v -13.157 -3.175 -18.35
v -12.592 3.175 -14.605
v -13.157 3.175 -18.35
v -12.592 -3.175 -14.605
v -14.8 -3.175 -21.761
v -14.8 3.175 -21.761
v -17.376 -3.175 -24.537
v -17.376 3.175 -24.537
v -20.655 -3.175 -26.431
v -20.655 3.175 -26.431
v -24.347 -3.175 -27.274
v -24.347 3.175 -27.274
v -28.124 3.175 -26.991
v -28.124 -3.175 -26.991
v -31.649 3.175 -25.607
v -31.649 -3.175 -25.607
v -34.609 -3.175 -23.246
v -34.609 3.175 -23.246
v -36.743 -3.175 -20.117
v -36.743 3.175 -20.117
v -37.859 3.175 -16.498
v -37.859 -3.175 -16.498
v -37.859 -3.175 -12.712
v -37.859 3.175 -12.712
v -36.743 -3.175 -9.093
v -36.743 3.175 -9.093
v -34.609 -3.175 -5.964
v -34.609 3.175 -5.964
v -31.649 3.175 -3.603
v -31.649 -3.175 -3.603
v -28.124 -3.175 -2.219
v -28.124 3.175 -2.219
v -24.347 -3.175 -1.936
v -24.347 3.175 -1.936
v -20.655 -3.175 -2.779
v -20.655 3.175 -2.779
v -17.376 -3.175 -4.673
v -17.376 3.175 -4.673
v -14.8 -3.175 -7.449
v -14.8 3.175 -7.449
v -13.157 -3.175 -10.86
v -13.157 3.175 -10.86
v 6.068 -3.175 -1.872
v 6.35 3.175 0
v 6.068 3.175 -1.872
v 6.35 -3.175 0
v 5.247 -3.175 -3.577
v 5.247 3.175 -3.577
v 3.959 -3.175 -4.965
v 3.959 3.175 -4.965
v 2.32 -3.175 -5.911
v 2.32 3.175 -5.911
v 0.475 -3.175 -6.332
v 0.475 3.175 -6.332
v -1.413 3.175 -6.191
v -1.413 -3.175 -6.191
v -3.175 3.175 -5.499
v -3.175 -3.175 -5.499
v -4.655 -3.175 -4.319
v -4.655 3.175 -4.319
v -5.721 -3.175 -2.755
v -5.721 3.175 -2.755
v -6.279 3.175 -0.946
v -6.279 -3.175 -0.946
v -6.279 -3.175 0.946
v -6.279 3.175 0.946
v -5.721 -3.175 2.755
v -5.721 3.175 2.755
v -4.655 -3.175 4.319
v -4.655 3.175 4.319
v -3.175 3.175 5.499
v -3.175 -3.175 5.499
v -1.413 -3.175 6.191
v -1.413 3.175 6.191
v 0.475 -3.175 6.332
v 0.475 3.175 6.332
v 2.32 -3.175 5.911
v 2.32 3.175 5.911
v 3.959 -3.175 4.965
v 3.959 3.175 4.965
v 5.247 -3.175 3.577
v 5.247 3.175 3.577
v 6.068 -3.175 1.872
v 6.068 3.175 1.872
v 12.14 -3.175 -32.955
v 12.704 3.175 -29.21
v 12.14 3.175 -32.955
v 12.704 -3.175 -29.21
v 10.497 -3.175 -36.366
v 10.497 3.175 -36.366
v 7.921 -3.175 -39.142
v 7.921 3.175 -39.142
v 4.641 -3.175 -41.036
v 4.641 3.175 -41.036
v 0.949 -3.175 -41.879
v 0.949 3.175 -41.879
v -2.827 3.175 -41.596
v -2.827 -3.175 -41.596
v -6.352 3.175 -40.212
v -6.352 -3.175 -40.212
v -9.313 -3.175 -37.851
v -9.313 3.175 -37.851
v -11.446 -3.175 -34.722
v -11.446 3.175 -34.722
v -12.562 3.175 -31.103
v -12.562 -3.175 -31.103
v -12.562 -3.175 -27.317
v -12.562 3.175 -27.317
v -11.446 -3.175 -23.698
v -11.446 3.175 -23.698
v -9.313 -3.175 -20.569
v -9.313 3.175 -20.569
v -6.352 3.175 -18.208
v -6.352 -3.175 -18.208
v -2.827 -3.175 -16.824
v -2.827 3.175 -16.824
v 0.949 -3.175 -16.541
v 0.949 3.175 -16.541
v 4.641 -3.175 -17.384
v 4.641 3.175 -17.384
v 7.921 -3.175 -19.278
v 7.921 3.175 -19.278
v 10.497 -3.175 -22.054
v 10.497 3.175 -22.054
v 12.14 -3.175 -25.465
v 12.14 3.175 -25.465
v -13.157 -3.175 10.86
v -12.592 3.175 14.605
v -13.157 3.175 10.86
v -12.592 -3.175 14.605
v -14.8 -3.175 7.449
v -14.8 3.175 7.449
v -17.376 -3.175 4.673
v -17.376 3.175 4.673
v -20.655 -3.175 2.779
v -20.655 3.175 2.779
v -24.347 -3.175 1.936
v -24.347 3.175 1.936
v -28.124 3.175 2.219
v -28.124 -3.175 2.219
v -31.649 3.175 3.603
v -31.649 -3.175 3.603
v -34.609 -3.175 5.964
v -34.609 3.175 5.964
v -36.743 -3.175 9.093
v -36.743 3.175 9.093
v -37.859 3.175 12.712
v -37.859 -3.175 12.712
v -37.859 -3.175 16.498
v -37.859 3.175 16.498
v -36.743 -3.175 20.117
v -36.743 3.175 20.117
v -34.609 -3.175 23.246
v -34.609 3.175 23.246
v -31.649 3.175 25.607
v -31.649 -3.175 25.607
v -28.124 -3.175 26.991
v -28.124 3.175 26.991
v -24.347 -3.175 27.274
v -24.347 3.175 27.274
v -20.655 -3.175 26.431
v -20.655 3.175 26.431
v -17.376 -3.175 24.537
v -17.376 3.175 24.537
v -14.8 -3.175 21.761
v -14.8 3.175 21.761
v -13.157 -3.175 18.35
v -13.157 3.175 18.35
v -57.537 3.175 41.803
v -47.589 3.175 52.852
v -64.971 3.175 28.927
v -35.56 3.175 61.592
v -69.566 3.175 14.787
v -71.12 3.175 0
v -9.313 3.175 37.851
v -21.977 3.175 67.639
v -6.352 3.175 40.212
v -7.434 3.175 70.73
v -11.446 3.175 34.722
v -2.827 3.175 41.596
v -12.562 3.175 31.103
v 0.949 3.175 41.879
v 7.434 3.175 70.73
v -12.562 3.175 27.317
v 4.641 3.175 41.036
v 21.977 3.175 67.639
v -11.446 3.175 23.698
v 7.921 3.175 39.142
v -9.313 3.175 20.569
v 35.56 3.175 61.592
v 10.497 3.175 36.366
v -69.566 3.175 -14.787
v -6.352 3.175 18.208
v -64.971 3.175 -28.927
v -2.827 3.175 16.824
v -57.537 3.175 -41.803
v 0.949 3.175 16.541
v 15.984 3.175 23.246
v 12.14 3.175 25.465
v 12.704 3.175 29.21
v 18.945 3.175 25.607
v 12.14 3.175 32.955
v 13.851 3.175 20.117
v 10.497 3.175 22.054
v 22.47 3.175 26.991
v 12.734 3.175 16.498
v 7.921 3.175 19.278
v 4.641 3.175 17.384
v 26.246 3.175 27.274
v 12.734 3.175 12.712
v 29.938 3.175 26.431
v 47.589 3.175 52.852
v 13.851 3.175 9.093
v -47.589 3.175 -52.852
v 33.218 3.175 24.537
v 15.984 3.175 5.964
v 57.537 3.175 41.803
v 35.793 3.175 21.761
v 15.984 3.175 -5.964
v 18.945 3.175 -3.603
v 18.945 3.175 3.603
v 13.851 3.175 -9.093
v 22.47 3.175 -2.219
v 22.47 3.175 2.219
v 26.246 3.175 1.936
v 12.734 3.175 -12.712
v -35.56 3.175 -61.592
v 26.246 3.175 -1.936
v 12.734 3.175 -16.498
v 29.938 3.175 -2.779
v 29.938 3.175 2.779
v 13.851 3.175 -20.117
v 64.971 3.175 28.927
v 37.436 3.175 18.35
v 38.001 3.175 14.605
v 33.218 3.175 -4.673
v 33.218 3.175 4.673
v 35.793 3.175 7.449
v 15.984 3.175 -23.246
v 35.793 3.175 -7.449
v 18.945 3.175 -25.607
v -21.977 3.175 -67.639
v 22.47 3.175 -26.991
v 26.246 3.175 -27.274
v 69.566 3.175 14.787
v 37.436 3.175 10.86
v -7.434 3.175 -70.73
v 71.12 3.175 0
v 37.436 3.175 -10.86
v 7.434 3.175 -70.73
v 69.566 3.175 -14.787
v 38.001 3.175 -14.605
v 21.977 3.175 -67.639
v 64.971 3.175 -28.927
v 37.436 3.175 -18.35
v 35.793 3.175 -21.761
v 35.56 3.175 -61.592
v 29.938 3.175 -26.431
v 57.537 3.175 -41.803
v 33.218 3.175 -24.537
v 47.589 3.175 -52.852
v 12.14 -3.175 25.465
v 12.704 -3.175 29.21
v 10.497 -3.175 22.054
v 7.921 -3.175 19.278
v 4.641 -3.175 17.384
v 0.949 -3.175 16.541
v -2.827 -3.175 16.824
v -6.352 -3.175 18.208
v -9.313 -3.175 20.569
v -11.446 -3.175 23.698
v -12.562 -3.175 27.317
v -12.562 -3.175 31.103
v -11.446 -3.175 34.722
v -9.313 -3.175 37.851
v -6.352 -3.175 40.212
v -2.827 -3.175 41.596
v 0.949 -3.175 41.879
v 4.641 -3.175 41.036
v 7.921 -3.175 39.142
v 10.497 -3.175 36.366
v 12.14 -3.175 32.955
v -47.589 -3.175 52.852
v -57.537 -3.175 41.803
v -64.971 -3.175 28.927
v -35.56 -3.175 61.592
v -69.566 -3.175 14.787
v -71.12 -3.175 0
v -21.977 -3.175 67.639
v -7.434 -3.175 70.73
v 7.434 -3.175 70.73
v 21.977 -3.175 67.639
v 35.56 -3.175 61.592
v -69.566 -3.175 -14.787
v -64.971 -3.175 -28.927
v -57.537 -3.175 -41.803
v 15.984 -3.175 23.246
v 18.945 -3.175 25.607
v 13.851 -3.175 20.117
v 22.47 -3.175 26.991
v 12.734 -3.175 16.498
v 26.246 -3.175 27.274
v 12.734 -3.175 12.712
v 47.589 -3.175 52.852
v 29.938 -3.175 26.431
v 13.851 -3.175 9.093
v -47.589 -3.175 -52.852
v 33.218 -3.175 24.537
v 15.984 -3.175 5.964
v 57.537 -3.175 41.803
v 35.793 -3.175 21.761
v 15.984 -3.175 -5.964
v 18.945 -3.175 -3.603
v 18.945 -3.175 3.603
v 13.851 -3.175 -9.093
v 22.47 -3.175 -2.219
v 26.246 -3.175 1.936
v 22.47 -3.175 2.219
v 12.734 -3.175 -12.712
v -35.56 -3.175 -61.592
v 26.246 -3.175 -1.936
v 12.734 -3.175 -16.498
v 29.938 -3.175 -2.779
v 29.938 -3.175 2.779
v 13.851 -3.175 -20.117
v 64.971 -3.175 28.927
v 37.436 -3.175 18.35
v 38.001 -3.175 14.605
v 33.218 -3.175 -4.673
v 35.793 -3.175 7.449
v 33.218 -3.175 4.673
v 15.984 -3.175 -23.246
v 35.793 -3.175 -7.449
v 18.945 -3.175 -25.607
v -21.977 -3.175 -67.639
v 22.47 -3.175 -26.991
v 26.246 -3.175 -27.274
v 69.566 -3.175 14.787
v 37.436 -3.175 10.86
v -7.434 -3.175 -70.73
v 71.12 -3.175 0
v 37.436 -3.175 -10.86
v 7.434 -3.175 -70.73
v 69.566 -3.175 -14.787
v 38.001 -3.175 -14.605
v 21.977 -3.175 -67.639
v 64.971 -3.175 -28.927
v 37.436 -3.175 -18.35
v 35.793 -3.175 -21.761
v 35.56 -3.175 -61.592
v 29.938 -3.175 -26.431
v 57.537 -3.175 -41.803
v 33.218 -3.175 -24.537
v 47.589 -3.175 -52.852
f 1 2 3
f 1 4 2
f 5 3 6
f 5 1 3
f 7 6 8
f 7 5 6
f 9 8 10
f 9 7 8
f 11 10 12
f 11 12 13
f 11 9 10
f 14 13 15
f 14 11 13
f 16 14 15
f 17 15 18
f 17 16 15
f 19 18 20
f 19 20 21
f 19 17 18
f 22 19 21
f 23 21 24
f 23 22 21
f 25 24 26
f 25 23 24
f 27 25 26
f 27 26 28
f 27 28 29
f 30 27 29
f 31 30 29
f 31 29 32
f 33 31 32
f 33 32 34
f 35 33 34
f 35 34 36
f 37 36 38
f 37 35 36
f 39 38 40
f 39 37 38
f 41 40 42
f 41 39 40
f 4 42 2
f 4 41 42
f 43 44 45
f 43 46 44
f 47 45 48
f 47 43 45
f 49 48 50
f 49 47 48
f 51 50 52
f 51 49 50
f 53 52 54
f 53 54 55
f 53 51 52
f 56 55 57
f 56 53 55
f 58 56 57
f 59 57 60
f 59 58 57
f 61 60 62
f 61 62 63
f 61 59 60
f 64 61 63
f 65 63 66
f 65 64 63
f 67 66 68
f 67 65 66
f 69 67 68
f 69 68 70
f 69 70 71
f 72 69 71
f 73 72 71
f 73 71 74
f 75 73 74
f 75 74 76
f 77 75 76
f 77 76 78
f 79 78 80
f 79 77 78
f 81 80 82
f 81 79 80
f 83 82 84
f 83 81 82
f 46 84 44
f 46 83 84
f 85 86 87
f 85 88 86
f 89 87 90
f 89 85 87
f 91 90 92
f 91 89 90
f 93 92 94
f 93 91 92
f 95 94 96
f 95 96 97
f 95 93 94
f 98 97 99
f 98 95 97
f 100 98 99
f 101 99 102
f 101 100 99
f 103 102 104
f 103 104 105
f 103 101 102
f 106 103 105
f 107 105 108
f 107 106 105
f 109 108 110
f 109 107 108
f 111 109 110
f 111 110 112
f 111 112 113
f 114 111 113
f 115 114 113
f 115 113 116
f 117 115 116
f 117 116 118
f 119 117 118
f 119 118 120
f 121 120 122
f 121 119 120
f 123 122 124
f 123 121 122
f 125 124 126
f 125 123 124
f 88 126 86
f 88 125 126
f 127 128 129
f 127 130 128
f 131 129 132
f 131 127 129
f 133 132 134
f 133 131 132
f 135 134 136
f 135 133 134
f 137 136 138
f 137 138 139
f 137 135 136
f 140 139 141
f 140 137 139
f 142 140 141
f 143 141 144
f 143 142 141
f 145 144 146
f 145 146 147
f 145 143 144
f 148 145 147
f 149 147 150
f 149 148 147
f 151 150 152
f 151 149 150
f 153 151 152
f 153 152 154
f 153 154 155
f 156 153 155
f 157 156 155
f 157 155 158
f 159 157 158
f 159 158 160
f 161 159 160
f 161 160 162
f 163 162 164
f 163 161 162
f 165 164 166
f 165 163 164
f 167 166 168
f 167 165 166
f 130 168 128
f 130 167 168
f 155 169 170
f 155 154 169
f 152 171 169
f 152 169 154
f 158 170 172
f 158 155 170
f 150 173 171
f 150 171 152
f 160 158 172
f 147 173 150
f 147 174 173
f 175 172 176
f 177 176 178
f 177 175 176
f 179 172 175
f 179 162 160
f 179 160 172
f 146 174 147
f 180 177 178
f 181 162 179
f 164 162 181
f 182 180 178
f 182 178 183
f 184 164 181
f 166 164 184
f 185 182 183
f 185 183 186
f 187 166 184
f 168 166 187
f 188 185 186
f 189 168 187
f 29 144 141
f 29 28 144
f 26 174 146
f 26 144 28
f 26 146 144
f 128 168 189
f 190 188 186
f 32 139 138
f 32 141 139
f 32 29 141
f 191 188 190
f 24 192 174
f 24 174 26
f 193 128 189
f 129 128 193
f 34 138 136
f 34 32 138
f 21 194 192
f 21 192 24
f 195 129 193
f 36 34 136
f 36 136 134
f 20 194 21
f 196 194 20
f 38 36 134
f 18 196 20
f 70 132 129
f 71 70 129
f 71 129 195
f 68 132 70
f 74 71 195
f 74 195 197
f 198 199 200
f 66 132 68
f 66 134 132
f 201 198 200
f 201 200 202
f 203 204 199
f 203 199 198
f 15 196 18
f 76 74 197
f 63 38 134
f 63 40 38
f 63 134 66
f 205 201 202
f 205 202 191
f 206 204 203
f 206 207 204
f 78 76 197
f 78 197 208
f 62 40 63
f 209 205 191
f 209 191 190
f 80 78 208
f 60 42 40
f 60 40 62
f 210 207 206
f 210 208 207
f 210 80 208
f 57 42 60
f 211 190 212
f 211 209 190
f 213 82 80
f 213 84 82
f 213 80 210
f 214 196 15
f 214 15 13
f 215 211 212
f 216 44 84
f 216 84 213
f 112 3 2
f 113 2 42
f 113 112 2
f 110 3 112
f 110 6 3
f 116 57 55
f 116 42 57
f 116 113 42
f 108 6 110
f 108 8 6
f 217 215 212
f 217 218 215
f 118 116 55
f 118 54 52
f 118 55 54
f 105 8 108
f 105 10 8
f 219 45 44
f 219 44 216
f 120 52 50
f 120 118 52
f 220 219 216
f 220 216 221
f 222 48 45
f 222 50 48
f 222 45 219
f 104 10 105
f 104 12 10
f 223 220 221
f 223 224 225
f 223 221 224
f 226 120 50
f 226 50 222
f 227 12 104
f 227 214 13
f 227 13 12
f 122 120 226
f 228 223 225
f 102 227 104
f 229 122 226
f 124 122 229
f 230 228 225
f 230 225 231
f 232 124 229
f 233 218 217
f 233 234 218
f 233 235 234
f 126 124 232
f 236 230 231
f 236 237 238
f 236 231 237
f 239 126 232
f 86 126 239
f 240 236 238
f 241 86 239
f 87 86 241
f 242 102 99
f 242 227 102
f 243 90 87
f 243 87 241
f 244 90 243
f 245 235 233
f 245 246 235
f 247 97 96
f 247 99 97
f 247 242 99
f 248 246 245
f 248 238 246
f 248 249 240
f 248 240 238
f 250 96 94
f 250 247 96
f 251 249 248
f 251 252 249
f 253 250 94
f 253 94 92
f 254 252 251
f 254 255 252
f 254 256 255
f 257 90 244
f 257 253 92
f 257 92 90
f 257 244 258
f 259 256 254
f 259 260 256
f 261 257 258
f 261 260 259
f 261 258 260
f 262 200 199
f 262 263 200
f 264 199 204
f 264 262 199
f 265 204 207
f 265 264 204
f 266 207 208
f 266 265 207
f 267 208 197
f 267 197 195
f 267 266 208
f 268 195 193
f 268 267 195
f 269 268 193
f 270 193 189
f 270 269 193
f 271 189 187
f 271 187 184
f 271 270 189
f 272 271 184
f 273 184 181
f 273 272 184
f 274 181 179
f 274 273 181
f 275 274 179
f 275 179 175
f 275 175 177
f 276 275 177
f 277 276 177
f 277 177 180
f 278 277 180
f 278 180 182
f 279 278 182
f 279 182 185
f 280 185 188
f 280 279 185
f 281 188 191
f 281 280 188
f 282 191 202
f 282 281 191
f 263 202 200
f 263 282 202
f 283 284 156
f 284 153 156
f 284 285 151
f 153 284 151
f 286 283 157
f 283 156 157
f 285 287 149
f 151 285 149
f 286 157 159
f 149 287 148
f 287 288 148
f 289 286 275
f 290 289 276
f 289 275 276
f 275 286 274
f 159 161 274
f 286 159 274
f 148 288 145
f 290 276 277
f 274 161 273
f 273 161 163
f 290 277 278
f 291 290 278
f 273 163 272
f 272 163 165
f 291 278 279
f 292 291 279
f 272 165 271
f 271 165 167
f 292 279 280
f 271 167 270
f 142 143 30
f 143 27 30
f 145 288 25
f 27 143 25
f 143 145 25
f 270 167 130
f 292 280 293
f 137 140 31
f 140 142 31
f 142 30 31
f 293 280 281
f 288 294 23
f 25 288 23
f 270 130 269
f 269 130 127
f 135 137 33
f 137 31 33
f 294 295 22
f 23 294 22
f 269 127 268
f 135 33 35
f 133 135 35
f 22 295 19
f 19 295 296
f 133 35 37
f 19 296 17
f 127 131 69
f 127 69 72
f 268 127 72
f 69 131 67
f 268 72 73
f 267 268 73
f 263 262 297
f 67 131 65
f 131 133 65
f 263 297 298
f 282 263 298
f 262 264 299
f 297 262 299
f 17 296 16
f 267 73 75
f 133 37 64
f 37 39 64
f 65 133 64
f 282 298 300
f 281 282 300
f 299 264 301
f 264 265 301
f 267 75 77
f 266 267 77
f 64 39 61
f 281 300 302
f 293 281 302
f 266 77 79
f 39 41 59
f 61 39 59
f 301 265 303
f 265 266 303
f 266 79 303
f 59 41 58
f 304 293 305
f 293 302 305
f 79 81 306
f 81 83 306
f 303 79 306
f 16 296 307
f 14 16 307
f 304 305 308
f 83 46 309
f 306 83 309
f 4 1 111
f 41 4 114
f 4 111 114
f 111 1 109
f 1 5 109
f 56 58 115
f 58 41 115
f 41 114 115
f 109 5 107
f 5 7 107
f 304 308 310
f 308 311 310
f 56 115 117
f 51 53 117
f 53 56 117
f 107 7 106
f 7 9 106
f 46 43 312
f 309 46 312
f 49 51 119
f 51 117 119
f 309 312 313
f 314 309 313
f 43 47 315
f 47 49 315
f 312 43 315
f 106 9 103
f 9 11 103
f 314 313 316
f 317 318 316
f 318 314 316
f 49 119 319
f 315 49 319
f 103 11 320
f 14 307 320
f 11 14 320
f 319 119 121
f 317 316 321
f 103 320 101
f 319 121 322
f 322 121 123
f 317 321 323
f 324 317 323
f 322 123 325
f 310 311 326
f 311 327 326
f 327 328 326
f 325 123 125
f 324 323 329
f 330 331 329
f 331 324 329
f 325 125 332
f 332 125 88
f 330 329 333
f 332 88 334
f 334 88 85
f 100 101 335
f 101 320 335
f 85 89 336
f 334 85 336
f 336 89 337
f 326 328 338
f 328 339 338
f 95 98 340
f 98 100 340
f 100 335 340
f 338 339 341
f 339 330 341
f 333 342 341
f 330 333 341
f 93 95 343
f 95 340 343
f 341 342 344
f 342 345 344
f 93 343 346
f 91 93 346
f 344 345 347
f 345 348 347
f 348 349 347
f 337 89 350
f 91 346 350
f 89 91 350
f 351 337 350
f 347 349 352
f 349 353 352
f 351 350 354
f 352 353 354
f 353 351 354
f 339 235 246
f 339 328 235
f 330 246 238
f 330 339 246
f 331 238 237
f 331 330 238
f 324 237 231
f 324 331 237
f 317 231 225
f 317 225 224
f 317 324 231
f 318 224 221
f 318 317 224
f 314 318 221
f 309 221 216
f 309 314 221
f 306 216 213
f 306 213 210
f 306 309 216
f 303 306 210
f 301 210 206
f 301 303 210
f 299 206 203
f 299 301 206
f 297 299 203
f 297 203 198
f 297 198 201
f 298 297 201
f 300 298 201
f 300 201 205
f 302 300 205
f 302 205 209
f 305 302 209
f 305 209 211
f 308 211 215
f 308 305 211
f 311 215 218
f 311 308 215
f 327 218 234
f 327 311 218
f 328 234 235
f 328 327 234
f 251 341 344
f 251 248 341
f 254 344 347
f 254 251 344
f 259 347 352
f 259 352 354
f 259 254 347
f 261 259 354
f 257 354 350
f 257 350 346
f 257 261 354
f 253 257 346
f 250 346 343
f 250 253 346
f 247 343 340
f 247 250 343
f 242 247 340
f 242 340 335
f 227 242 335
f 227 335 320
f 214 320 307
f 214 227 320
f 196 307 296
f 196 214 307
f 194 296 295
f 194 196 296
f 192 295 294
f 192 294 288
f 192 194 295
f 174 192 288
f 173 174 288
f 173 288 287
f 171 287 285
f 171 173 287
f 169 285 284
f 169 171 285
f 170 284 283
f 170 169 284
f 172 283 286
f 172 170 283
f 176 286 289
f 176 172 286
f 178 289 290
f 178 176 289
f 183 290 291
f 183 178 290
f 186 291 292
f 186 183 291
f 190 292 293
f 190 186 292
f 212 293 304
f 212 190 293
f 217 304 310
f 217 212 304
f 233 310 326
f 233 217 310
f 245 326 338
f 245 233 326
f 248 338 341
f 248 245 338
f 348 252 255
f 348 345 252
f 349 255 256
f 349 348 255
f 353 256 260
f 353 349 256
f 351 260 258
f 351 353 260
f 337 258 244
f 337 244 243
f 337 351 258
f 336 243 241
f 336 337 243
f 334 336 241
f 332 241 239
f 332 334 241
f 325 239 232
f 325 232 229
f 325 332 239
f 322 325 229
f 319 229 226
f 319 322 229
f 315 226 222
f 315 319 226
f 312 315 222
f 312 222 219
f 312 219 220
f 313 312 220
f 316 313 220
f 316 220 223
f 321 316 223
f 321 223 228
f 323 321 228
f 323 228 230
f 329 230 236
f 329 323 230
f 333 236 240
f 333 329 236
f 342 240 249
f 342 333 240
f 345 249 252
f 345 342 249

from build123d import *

# Parameters (mm, degrees)
SKETCH1_R           = 71.12
SKETCH1_R_2         = 12.704134002
SKETCH1_R_3         = 6.35
BOSS_EXTRUDE1_DEPTH = 3.175


with BuildPart() as part:
    # Sketch1 → Boss-Extrude1 (new body, symmetric)
    with BuildSketch(Plane(origin=(0, 0, 0), x_dir=(1, 0, 0), z_dir=(0, 1, 0))):
        Circle(SKETCH1_R)
        with Locations((-25.296602045, 14.605)):
            Circle(SKETCH1_R_2, mode=Mode.SUBTRACT)
        with Locations((-25.296602045, -14.605)):
            Circle(SKETCH1_R_2, mode=Mode.SUBTRACT)
        with Locations((0, -29.21)):
            Circle(SKETCH1_R_2, mode=Mode.SUBTRACT)
        with Locations((25.296602045, -14.605)):
            Circle(SKETCH1_R_2, mode=Mode.SUBTRACT)
        with Locations((25.296602045, 14.605)):
            Circle(SKETCH1_R_2, mode=Mode.SUBTRACT)
        with Locations((0, 29.21)):
            Circle(SKETCH1_R_2, mode=Mode.SUBTRACT)
        Circle(SKETCH1_R_3, mode=Mode.SUBTRACT)
    extrude(amount=BOSS_EXTRUDE1_DEPTH, both=True)


solid = part.part
